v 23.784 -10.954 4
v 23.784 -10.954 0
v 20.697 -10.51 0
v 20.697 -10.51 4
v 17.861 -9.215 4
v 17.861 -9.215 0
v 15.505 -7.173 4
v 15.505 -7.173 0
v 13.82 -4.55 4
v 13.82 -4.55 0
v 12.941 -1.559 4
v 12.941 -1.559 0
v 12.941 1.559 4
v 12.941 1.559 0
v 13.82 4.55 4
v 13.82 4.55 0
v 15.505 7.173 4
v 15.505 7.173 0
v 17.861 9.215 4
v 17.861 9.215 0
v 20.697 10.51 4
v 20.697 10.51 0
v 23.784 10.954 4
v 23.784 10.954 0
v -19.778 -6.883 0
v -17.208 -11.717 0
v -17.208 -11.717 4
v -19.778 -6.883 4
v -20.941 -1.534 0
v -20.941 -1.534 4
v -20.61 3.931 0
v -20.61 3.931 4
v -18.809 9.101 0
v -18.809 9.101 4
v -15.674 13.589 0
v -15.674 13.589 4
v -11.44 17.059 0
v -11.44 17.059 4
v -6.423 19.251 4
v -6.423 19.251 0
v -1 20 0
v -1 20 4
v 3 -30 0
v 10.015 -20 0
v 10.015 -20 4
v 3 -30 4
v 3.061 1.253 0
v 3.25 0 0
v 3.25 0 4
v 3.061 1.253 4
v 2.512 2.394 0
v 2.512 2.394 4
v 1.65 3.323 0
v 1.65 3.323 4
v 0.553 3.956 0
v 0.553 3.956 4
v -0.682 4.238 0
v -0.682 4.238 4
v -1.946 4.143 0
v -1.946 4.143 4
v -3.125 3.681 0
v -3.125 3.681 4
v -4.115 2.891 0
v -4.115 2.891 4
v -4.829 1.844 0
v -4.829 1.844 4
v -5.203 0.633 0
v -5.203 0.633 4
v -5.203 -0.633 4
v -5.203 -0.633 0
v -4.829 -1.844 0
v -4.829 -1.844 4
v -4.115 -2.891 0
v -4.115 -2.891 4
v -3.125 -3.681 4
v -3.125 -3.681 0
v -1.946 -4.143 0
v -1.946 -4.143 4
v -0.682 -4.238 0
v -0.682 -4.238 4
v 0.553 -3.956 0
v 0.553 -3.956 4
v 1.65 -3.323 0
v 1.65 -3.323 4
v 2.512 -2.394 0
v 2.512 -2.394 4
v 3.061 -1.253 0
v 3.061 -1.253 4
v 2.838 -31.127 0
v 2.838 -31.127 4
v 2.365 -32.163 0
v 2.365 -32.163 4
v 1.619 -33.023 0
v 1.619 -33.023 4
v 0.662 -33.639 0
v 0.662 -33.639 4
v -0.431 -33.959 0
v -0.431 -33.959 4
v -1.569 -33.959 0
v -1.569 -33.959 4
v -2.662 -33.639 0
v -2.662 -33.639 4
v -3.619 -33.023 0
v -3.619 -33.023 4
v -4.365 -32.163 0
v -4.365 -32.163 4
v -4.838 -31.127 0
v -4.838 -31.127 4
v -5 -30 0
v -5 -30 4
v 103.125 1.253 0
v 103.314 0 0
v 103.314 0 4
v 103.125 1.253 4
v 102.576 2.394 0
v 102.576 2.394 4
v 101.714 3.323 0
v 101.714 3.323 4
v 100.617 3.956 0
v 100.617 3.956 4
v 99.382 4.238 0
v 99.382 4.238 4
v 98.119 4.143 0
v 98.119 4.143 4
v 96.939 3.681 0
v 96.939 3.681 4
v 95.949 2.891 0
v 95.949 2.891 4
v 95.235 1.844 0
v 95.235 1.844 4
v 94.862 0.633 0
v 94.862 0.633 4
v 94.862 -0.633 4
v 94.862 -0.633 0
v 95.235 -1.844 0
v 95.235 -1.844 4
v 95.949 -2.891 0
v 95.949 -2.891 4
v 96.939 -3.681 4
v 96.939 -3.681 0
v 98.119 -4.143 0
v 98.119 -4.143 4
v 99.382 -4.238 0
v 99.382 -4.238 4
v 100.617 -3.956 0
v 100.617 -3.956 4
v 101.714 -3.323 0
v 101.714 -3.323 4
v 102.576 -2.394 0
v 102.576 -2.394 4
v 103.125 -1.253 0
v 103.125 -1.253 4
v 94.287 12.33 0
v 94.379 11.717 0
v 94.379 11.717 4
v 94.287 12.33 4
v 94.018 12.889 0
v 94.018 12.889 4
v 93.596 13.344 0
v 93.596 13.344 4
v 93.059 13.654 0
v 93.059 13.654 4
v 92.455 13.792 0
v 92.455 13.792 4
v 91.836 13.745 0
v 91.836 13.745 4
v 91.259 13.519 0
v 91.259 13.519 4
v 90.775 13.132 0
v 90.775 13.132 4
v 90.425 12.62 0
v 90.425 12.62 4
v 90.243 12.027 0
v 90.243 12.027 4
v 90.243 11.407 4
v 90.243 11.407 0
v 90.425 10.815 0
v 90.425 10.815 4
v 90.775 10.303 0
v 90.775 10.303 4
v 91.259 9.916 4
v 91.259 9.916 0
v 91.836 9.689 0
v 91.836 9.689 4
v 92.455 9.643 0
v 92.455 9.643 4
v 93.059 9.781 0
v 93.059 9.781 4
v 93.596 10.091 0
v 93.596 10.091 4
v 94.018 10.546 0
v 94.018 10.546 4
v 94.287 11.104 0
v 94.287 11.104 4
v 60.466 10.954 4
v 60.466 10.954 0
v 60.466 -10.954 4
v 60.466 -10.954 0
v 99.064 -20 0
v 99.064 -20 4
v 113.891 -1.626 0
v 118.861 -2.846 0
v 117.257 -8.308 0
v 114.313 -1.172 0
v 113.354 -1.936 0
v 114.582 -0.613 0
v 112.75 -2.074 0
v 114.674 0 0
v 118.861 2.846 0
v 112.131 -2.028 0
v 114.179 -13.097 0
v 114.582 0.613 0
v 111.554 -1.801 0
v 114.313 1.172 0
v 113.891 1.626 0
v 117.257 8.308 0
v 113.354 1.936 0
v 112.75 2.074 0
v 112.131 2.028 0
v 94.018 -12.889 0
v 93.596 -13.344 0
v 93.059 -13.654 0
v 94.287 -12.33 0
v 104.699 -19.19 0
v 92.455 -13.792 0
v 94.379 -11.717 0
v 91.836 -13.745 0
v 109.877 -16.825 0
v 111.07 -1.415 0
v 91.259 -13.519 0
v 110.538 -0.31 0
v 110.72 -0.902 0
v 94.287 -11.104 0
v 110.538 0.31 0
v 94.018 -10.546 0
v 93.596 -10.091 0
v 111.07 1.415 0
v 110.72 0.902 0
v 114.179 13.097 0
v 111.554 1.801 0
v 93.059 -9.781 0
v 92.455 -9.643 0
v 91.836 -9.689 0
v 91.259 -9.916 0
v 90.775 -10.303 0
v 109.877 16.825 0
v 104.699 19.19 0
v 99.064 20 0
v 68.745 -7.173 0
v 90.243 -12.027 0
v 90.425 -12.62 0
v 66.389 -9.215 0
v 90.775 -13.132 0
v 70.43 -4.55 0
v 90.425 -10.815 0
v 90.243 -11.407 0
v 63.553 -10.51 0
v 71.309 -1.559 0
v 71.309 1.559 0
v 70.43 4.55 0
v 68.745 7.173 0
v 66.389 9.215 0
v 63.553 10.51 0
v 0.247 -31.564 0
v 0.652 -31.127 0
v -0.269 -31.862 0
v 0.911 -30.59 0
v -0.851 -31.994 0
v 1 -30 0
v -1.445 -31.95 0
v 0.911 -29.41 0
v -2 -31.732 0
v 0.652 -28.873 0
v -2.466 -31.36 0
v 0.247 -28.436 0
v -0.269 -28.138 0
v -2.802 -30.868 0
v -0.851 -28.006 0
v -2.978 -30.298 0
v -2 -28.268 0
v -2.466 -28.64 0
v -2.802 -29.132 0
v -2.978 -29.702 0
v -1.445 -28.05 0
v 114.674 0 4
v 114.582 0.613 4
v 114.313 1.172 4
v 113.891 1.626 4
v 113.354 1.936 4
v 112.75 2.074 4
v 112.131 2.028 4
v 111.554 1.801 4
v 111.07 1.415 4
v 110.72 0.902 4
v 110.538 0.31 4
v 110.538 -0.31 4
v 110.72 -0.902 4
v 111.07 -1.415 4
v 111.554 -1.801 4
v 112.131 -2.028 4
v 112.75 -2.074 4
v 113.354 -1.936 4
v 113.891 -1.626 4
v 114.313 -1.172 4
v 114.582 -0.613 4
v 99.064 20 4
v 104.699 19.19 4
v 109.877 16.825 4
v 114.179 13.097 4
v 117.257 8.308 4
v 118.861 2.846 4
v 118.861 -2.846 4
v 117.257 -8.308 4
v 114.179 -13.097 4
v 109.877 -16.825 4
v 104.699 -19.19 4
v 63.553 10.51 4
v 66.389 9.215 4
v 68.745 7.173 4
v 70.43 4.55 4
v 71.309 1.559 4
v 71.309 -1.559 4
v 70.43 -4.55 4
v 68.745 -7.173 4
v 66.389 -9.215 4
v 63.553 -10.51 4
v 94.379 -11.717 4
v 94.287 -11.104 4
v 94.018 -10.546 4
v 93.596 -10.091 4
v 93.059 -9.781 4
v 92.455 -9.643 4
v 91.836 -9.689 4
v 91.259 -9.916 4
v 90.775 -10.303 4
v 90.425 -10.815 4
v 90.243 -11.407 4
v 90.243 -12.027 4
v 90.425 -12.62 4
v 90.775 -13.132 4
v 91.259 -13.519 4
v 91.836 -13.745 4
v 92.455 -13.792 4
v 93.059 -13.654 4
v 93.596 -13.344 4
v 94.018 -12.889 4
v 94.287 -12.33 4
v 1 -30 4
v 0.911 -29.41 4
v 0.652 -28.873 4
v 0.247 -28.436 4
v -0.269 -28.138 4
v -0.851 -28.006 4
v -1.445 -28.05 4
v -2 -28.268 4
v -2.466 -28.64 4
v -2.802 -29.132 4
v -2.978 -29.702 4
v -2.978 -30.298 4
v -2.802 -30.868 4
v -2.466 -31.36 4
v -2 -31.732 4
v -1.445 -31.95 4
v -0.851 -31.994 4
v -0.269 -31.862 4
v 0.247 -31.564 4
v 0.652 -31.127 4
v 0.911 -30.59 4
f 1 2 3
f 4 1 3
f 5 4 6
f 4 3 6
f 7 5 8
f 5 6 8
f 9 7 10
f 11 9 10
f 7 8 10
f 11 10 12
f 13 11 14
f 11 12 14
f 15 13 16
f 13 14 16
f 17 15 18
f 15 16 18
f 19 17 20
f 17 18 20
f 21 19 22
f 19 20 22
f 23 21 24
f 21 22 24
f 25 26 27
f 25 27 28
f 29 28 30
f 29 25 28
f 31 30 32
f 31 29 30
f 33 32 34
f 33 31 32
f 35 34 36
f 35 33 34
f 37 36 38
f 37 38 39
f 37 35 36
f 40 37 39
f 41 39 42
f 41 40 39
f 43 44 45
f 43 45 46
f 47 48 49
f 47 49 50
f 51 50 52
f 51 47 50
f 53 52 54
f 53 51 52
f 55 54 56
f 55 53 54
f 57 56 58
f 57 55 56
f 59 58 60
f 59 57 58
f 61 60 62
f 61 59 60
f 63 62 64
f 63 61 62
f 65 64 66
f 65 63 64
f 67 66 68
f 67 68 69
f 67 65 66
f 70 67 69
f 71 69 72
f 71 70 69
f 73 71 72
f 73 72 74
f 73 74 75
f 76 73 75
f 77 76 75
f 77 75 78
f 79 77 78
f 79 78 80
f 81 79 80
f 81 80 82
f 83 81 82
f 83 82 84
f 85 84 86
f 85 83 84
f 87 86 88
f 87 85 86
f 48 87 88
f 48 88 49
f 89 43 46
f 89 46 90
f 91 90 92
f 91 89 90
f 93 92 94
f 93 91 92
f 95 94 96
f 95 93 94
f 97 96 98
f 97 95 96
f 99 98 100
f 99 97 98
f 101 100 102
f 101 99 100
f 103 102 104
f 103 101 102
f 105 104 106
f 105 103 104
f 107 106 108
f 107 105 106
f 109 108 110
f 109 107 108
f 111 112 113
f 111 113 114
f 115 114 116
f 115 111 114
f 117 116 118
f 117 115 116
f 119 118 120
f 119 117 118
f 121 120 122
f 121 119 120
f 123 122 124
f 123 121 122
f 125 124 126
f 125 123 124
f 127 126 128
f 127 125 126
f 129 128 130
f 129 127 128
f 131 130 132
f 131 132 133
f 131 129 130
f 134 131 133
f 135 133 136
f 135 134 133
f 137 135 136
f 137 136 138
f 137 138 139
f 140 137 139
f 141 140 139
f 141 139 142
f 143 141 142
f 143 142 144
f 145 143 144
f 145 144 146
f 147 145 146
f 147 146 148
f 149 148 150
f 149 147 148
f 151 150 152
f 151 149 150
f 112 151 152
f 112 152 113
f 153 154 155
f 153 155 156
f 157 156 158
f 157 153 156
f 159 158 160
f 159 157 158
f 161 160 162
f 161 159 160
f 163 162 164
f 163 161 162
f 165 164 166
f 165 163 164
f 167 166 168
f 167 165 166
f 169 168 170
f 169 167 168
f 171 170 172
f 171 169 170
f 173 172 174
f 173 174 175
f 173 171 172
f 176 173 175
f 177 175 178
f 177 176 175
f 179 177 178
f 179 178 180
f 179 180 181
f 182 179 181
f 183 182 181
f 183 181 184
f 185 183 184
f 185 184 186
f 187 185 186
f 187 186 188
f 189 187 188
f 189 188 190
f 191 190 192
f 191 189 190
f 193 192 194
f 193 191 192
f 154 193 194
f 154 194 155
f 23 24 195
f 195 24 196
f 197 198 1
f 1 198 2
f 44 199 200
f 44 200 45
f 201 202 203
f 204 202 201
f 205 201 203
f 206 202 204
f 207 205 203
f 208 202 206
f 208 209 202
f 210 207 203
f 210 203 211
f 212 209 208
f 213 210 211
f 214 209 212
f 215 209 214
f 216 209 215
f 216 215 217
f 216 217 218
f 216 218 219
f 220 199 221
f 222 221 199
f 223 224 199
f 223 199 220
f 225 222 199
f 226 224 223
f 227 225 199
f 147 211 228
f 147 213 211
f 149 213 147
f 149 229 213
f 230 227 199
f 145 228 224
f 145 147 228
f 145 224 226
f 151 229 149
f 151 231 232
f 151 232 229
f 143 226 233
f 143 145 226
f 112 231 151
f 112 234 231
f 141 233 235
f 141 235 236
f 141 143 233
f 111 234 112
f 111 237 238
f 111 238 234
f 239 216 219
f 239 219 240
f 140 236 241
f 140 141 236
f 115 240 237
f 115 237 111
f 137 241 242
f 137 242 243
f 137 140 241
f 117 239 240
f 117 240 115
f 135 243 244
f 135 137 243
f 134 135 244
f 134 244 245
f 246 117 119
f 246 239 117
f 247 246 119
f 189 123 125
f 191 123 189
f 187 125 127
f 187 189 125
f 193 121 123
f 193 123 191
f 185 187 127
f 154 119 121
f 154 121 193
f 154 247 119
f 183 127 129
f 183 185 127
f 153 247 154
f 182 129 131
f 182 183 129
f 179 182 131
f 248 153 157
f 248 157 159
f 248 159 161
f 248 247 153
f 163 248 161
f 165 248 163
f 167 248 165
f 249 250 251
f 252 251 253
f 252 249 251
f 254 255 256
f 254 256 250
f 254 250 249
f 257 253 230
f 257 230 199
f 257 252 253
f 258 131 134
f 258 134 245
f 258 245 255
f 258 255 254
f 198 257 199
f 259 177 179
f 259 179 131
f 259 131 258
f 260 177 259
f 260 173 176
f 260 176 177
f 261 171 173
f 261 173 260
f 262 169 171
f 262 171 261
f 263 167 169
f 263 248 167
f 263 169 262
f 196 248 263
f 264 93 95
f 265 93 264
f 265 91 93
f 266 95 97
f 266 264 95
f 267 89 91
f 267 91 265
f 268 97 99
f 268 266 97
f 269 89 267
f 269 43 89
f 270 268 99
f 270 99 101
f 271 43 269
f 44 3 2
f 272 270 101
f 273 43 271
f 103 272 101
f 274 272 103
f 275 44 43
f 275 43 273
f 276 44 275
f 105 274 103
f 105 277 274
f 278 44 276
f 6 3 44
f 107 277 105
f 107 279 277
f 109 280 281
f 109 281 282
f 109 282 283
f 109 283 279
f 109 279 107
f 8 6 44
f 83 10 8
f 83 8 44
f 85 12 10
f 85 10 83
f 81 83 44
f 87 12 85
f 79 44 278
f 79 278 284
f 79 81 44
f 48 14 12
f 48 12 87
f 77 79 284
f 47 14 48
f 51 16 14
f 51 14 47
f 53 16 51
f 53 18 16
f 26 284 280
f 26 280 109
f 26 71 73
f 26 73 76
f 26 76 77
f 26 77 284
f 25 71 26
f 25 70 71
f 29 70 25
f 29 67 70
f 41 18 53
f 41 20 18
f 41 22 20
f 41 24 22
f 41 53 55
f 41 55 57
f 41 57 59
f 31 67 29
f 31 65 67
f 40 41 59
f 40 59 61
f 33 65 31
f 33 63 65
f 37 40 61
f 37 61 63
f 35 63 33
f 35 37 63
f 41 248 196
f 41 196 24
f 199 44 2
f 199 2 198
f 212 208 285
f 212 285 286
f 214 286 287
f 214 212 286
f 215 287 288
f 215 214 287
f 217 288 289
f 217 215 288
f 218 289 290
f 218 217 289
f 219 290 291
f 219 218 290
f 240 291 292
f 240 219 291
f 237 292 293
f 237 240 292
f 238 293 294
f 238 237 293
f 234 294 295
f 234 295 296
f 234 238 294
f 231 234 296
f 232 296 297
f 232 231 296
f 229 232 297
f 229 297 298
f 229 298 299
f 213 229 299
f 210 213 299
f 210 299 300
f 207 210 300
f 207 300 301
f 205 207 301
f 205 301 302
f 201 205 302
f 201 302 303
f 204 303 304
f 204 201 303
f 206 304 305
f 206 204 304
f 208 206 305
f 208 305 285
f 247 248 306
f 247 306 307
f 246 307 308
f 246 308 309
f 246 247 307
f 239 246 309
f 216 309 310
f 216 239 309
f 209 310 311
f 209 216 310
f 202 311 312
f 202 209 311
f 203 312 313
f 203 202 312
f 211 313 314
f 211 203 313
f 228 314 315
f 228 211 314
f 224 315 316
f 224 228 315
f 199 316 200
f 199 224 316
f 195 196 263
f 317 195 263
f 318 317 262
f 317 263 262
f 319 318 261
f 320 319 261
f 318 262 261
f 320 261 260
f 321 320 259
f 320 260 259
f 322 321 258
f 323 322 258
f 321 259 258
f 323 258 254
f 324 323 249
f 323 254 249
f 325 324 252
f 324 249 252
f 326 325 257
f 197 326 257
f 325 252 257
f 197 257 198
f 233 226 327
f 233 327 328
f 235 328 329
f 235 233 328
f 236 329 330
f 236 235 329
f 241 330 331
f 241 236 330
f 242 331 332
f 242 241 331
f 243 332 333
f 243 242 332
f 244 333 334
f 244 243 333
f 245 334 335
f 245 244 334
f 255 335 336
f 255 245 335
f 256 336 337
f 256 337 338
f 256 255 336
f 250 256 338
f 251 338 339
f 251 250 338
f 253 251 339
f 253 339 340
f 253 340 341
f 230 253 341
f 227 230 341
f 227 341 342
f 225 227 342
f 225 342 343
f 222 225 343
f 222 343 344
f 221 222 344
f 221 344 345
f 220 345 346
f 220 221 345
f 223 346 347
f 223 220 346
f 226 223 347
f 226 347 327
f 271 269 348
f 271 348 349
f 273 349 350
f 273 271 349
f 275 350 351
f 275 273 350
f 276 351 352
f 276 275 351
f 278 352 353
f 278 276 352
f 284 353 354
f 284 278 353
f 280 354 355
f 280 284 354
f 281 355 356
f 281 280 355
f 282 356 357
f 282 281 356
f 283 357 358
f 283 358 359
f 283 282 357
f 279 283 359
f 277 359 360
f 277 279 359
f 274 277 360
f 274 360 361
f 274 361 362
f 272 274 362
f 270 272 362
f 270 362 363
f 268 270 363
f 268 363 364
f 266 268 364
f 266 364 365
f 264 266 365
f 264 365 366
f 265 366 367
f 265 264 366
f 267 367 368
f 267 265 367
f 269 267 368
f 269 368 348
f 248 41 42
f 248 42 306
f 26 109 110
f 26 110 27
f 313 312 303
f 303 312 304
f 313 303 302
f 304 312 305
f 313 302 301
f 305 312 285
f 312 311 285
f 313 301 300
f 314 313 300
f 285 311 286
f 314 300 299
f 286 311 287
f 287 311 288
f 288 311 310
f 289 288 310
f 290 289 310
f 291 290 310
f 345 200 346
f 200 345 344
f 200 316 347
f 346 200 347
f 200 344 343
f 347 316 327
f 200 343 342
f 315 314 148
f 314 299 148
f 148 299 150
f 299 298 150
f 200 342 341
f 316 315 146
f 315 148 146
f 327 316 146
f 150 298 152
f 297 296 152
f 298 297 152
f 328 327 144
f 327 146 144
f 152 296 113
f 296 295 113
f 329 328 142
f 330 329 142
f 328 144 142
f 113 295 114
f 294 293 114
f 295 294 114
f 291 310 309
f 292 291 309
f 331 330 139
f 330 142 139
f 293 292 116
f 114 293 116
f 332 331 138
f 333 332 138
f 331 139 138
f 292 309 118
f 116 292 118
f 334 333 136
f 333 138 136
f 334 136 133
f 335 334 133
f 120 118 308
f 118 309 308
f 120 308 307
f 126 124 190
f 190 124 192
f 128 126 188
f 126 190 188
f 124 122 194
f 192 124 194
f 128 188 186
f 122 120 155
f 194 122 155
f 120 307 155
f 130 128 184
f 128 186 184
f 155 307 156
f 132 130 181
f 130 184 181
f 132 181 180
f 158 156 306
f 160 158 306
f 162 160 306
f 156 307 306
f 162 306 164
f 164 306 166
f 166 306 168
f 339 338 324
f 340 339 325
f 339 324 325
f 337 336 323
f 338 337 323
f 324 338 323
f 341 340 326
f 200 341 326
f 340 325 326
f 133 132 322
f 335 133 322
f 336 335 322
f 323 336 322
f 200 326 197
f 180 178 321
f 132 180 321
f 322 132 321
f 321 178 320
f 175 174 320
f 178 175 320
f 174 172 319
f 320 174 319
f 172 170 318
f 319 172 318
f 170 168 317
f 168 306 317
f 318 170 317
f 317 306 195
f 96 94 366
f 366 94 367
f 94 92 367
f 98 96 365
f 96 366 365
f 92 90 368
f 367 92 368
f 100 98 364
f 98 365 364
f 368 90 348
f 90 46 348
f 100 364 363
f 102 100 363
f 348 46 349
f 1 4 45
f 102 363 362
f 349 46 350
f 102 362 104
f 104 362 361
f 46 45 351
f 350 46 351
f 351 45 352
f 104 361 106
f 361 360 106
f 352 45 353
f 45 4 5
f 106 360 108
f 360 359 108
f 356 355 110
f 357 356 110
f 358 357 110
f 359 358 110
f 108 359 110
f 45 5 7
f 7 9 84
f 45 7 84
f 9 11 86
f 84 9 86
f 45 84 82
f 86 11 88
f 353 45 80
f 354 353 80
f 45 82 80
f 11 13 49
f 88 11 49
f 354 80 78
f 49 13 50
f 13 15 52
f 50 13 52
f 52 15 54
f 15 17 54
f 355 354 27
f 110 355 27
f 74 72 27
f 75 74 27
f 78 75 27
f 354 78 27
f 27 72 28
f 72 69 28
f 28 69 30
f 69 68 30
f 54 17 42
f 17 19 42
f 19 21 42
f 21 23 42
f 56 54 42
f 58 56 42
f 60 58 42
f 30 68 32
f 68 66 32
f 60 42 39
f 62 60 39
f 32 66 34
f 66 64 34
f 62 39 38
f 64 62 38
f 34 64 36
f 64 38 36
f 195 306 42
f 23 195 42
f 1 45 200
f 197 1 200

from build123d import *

# Parameters (mm, degrees)
SKETCH_1_R      = 4.25
SKETCH_1_R_2    = 2.08
SKETCH_1_R_3    = 2
EXTRUDE_1_DEPTH = 4


with BuildPart() as part:
    # 草图1 → 凸台-拉伸1 (new body)
    with BuildSketch(Plane.XY):
        with BuildLine():
            Line((-1, 20), (99.064295006, 20))
            ThreePointArc((99.064295006, 20), (119.064295006, 0), (99.064295006, -20))
            Line((99.064295006, -20), (10.014533743, -20))
            Line((10.014533743, -20), (3, -30))
            ThreePointArc((3, -30), (-1, -34), (-5, -30))
            Line((-5, -30), (-17.208156126, -11.717323713))
            ThreePointArc((-17.208156126, -11.717323713), (-18.809358134, 9.10092099), (-1, 20))
        make_face()
        with Locations((-1, 0)):
            Circle(SKETCH_1_R, mode=Mode.SUBTRACT)
        with Locations((99.064295006, 0)):
            Circle(SKETCH_1_R, mode=Mode.SUBTRACT)
        with Locations((112.594295006, 0)):
            Circle(SKETCH_1_R_2, mode=Mode.SUBTRACT)
        with Locations((92.299295006, -11.717323713)):
            Circle(SKETCH_1_R_2, mode=Mode.SUBTRACT)
        with Locations((92.299295006, 11.717323713)):
            Circle(SKETCH_1_R_2, mode=Mode.SUBTRACT)
        with Locations((-1, -30)):
            Circle(SKETCH_1_R_3, mode=Mode.SUBTRACT)
        with BuildLine():
            Line((23.78352134, 10.95385289), (60.46647866, 10.95385289))
            ThreePointArc((60.46647866, 10.95385289), (71.420331549, 0), (60.46647866, -10.95385289))
            Line((60.46647866, -10.95385289), (23.78352134, -10.95385289))
            ThreePointArc((23.78352134, -10.95385289), (12.829668451, 0), (23.78352134, 10.95385289))
        make_face(mode=Mode.SUBTRACT)
    extrude(amount=EXTRUDE_1_DEPTH)


solid = part.part
